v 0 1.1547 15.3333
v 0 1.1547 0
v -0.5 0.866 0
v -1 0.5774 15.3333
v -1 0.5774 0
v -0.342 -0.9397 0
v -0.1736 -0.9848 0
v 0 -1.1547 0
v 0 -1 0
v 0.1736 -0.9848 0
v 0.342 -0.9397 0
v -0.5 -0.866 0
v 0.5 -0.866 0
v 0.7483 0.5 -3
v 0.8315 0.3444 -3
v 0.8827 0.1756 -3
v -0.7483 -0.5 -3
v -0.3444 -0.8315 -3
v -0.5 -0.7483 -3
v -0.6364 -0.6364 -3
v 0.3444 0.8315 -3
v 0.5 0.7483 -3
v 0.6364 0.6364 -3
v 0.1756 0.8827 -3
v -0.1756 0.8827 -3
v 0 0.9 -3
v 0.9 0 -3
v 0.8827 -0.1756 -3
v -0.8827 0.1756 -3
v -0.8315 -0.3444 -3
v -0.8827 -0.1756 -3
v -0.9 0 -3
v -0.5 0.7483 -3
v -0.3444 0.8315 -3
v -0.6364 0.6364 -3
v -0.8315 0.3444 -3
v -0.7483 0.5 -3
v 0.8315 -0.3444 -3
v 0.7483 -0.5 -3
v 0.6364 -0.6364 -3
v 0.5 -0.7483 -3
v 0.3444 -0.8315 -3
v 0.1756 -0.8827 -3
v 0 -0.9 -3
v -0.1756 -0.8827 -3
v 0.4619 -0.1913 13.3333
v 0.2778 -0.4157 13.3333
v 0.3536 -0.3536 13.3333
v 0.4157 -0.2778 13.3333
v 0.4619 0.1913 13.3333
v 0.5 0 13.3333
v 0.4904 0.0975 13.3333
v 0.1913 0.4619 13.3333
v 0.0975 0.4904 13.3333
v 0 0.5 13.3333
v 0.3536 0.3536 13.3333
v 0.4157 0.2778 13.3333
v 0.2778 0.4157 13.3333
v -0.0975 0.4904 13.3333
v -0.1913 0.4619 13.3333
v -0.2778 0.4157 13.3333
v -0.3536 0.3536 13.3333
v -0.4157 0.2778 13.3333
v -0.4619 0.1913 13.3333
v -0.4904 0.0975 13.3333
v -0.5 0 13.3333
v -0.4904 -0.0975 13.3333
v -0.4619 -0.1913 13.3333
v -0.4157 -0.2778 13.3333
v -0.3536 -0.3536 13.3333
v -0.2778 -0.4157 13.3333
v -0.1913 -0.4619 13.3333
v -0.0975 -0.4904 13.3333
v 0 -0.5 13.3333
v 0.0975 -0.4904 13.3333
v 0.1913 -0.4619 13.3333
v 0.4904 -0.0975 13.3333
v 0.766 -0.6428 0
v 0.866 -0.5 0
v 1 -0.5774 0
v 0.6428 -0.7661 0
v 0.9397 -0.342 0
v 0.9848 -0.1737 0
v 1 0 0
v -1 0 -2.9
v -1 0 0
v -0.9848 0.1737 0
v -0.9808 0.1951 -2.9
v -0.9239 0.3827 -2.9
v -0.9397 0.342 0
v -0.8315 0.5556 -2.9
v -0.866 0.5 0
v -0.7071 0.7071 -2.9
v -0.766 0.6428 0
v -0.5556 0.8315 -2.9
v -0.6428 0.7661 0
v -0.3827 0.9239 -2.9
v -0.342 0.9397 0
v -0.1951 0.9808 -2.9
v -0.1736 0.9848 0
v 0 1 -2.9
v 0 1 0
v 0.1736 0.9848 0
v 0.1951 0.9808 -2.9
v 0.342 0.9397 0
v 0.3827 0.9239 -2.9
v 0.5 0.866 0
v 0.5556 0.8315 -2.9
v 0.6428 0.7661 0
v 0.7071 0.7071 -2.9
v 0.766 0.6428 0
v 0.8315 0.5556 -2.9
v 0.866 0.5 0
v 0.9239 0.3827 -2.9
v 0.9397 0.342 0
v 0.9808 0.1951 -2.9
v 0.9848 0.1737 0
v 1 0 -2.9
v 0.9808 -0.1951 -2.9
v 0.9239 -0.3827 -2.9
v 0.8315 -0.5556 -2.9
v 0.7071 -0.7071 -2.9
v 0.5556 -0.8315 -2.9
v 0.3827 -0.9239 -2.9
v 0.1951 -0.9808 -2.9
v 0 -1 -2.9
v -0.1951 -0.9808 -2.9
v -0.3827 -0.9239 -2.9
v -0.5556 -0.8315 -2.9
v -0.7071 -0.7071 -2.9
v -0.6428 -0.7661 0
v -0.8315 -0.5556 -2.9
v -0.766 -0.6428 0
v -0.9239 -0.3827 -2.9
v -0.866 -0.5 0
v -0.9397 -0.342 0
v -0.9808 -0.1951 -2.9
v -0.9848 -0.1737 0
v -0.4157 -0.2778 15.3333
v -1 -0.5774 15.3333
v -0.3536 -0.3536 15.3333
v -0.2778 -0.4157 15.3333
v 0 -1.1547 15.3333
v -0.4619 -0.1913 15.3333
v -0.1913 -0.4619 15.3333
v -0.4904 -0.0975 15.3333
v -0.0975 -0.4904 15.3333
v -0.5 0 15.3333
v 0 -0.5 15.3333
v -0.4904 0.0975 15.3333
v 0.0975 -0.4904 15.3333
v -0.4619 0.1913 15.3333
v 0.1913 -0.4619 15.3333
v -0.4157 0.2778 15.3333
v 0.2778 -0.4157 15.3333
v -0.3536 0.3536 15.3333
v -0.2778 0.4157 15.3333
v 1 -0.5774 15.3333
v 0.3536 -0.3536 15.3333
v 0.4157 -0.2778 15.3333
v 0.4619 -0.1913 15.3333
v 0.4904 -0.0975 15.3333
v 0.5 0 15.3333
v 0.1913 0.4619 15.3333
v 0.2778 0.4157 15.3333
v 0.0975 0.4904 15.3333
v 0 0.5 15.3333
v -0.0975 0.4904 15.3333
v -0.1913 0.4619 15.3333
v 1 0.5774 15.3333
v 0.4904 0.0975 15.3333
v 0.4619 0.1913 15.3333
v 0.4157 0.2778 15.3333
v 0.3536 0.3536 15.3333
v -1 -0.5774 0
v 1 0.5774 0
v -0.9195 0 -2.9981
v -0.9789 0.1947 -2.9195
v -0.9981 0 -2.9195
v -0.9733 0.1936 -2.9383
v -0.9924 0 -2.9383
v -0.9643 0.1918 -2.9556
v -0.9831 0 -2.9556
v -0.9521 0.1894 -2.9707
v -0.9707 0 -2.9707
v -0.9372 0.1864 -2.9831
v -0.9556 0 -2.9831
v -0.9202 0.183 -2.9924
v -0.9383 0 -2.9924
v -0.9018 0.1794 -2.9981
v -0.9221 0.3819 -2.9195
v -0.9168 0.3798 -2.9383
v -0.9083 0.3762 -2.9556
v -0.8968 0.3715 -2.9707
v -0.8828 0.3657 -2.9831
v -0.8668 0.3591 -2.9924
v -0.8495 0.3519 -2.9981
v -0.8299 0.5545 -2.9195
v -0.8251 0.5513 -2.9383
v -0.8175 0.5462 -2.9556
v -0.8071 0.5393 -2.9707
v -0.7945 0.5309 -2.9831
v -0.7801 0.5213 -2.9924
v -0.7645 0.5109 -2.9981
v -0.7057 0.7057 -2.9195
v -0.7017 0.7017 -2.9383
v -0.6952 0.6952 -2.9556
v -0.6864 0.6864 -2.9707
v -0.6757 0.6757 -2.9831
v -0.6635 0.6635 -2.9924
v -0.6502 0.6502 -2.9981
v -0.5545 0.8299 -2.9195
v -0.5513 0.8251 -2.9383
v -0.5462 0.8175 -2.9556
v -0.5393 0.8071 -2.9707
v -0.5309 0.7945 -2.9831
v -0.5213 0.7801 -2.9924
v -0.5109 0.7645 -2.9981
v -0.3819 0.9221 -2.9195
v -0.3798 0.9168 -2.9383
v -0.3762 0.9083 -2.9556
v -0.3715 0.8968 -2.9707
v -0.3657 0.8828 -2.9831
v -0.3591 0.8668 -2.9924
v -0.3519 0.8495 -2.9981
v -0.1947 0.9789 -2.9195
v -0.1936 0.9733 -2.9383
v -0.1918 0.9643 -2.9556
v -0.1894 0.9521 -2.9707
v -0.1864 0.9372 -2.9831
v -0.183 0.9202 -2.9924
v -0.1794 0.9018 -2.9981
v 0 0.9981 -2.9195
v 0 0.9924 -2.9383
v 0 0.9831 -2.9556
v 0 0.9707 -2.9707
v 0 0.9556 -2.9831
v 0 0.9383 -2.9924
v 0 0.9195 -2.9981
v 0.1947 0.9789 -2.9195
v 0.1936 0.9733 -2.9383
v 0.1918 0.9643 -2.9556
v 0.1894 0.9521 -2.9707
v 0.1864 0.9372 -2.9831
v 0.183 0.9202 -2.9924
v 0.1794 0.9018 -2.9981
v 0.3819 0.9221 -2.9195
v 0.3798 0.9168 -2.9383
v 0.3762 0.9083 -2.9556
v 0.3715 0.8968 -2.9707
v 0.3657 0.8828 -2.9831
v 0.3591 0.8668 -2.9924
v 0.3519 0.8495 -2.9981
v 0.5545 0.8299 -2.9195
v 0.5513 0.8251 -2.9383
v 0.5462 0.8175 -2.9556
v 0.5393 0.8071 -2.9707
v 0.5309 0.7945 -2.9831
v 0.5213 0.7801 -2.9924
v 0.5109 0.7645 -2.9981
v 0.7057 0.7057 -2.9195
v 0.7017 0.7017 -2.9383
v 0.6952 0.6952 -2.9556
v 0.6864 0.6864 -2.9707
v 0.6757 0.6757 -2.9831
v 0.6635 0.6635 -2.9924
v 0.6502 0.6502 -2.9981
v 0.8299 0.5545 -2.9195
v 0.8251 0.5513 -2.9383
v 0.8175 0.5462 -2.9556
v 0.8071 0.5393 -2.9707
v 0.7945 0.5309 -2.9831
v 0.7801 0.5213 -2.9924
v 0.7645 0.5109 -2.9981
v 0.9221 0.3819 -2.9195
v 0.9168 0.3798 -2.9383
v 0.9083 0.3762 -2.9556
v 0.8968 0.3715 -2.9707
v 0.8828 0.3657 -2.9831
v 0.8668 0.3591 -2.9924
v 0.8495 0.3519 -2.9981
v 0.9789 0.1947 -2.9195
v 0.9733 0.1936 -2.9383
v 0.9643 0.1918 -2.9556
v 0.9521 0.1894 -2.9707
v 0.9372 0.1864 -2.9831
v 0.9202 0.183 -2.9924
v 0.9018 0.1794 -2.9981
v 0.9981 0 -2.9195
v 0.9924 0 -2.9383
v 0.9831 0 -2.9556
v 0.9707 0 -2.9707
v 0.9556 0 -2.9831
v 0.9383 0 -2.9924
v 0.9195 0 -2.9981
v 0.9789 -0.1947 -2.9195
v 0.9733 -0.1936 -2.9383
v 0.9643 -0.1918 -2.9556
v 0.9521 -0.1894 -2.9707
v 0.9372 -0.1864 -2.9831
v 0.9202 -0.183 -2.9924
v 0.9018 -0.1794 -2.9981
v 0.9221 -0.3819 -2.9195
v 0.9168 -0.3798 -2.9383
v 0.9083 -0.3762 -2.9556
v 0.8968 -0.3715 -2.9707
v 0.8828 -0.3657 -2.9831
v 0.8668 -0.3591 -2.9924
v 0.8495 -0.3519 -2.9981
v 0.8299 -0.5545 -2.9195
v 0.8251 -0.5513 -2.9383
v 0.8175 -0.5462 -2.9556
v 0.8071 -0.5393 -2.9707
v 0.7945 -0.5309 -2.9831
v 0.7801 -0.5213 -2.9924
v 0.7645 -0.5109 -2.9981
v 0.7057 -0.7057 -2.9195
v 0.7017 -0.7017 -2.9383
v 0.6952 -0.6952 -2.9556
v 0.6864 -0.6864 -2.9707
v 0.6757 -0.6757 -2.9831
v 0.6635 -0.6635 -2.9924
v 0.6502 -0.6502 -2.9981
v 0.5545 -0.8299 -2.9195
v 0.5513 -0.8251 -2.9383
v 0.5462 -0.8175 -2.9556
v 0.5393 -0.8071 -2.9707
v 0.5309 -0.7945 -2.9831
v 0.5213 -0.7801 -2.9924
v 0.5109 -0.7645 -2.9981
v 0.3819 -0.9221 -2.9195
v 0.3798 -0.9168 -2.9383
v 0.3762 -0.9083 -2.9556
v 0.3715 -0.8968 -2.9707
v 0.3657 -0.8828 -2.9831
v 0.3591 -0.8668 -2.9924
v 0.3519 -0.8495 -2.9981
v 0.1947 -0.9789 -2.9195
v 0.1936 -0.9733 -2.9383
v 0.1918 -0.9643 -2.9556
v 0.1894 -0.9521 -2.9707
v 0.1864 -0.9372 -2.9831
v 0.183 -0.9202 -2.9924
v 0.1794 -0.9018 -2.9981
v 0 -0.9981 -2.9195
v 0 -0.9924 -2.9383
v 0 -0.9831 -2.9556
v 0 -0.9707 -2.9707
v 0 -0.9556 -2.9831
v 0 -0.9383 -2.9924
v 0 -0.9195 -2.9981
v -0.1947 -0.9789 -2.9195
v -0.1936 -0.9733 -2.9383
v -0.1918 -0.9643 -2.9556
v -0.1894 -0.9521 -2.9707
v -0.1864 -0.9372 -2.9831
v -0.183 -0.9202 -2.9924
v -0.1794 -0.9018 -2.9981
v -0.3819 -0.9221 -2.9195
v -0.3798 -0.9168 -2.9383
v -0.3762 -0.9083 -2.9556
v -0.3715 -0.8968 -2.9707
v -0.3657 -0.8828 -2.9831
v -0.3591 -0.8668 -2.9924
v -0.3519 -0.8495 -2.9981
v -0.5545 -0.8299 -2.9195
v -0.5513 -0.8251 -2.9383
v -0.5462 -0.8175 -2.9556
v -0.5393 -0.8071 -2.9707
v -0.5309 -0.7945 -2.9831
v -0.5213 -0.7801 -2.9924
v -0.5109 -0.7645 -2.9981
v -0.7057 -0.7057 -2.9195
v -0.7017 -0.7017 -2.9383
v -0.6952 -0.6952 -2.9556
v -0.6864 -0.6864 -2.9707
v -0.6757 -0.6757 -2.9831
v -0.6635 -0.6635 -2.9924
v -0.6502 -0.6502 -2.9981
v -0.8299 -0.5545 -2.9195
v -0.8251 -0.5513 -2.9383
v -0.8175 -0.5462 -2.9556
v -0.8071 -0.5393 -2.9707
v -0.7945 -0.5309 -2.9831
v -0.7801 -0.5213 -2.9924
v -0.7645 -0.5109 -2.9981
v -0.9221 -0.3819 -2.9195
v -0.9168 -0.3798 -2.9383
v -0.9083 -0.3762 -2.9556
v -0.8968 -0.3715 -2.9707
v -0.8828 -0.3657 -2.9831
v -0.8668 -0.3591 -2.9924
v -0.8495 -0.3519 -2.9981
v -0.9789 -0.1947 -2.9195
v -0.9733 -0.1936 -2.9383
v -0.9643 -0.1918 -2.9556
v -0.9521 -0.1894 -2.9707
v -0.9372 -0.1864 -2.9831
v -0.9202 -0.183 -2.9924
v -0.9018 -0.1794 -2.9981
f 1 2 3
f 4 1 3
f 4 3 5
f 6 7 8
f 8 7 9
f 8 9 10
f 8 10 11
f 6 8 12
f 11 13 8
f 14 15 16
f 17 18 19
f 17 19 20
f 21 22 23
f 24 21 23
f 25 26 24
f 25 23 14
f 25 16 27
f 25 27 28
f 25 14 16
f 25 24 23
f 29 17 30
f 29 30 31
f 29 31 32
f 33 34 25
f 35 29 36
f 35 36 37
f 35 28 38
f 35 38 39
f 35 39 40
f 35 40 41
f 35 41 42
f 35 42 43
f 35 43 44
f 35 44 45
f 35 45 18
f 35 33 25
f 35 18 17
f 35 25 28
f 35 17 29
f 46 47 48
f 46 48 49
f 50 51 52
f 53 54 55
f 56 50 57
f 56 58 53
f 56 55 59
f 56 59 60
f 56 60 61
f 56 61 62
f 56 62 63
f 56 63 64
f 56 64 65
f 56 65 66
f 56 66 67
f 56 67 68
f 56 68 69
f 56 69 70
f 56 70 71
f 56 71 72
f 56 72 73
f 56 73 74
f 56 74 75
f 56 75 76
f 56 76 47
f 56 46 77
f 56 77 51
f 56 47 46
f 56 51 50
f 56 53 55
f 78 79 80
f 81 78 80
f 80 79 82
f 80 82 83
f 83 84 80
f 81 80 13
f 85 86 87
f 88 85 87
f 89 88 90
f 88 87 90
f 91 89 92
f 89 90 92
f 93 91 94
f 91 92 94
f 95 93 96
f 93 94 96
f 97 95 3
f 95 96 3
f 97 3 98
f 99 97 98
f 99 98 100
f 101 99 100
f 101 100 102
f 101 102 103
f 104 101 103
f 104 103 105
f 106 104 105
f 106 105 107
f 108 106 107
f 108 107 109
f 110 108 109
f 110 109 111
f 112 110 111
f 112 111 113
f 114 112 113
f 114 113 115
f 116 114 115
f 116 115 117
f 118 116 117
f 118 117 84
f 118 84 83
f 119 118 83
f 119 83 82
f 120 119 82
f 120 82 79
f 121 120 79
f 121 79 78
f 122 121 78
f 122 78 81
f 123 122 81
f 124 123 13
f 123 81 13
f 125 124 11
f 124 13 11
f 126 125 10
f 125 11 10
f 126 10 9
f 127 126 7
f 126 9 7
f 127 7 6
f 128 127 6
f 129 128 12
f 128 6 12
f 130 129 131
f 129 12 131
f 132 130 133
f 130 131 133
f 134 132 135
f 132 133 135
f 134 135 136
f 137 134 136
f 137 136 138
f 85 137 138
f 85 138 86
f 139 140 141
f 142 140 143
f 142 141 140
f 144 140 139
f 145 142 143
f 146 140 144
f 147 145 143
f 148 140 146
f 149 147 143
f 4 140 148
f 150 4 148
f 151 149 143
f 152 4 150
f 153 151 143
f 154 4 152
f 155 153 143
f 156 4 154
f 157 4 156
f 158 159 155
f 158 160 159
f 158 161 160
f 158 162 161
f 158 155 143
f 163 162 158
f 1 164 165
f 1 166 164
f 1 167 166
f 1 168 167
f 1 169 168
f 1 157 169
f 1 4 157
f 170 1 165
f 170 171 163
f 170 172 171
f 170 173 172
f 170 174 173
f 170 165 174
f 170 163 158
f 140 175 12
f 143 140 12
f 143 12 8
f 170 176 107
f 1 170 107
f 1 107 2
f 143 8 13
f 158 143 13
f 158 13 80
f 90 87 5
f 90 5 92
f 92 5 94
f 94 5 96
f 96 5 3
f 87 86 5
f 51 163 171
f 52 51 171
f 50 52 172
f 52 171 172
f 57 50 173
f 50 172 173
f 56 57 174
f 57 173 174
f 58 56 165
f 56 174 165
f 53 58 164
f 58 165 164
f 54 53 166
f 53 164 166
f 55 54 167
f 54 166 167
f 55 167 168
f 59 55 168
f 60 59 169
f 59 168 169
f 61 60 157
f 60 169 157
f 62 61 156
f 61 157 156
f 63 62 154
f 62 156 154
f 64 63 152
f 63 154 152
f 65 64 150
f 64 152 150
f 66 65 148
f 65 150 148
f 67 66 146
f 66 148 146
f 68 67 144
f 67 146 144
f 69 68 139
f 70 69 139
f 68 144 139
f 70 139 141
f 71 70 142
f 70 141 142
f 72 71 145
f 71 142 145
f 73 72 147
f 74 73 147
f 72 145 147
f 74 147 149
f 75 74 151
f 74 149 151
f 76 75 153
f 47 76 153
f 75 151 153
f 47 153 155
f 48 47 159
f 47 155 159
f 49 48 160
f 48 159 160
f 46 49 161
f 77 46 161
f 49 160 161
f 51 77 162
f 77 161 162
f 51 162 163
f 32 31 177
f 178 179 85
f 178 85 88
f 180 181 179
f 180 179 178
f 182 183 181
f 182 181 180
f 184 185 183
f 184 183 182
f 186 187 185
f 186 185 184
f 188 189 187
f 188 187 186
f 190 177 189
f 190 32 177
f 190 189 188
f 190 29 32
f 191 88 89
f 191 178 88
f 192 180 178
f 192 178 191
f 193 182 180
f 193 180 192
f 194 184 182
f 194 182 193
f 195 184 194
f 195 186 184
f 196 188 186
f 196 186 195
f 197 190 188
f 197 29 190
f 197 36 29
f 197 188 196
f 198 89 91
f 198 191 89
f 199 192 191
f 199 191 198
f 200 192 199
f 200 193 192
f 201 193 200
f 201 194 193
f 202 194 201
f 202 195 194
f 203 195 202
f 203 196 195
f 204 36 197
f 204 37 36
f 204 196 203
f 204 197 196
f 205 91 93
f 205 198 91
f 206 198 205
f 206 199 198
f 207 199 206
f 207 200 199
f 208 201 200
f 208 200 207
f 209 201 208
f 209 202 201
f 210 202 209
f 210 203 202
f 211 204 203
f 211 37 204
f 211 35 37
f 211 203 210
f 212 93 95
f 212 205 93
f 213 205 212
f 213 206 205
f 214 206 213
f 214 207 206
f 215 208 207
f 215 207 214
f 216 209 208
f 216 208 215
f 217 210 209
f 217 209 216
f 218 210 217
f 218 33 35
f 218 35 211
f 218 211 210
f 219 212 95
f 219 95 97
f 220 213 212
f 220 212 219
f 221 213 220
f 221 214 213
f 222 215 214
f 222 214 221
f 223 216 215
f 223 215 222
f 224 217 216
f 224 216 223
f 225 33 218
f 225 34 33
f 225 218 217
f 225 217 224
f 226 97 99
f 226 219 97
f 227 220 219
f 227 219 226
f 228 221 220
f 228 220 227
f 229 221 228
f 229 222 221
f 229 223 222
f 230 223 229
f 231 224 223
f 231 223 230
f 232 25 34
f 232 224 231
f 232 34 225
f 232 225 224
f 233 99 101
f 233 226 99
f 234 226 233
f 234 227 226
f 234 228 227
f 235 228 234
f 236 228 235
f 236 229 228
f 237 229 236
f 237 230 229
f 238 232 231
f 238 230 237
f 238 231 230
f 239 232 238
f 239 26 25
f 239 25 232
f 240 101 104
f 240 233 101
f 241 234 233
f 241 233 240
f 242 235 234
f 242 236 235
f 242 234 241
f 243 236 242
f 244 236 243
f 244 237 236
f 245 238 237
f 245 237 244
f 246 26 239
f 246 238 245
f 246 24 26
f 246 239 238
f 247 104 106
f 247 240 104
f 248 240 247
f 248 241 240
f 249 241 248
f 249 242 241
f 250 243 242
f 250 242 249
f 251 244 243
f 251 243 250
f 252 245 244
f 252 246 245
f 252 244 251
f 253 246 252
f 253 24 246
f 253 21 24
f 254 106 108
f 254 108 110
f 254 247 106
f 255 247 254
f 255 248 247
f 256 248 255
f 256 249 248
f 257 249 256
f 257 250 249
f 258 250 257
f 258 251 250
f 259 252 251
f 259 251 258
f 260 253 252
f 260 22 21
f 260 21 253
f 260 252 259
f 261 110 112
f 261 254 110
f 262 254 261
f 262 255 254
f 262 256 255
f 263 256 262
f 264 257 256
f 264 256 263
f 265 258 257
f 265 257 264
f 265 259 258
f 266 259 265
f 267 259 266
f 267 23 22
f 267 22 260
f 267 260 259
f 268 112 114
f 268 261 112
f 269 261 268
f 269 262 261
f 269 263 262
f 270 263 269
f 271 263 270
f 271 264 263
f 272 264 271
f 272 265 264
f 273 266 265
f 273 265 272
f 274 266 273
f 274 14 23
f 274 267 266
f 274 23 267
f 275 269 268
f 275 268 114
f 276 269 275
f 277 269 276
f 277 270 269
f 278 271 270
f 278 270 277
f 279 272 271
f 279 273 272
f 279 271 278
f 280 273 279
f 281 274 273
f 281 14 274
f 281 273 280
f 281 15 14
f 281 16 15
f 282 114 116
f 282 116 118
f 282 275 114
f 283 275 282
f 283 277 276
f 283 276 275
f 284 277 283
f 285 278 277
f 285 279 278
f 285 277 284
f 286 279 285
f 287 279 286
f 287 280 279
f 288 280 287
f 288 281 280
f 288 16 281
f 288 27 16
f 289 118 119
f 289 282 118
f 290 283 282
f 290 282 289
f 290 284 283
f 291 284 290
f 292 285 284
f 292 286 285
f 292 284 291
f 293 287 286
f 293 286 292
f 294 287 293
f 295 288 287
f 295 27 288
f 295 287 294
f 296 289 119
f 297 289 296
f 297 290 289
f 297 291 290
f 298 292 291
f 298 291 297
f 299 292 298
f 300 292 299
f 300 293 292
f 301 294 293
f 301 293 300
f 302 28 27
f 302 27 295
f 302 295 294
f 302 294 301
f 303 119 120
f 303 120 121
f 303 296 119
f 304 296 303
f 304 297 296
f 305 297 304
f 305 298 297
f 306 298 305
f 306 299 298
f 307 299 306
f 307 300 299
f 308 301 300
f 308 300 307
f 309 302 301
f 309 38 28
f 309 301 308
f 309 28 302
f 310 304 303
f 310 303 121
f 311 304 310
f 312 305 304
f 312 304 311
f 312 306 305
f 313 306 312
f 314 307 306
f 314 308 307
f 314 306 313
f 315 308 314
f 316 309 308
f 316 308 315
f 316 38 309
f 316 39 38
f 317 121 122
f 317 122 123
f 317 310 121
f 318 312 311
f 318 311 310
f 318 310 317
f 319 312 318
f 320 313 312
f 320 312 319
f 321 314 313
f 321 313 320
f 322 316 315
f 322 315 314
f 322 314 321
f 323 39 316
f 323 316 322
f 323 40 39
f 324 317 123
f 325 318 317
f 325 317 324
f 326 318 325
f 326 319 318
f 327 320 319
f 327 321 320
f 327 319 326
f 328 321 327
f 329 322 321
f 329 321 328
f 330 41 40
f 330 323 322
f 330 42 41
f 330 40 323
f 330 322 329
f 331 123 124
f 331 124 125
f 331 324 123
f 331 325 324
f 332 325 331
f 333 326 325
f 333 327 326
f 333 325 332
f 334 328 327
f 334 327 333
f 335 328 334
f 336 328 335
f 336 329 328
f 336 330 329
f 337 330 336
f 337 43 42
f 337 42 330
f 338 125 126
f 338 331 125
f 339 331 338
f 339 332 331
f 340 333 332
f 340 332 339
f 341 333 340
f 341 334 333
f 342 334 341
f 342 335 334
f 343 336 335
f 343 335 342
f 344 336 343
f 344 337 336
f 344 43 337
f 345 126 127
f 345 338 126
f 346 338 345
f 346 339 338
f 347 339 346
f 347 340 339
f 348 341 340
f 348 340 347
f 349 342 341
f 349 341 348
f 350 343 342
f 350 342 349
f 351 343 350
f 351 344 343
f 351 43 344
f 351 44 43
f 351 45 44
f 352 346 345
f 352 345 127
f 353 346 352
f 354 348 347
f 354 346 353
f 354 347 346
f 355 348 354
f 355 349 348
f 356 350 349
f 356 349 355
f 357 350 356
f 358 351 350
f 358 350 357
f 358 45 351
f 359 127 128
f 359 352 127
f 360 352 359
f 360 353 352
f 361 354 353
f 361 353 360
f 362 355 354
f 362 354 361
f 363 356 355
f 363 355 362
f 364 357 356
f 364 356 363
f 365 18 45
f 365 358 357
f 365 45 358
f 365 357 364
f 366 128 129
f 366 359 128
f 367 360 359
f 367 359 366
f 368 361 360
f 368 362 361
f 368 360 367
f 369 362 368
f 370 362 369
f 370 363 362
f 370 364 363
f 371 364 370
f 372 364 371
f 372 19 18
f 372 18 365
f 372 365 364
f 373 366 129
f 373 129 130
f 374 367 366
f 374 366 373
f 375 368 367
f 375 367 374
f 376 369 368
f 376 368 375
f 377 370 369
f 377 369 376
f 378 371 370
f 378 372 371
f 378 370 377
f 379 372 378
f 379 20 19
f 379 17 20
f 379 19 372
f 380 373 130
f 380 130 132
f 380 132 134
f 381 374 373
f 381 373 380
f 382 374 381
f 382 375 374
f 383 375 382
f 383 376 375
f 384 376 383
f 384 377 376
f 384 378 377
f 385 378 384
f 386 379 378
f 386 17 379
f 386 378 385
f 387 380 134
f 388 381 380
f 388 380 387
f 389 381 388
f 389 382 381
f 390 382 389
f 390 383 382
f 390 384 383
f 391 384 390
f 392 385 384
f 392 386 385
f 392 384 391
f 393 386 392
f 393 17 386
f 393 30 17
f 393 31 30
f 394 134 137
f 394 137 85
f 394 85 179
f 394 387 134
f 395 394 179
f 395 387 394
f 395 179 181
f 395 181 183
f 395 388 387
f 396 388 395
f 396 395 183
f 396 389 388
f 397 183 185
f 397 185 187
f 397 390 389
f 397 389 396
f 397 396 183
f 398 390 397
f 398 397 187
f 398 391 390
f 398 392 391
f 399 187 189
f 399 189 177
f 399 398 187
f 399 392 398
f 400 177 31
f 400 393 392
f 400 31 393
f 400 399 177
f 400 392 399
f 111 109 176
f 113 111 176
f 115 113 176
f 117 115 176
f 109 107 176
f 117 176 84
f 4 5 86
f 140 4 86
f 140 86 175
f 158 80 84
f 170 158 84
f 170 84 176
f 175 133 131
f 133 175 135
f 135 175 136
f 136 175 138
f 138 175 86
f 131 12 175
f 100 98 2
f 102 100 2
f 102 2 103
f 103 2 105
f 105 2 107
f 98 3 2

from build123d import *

# Parameters (mm, degrees)
BOSS_EXTRUDE1_DEPTH = 15.333333333
SKETCH2_R           = 0.5
CUT_EXTRUDE1_DEPTH  = 2
SKETCH3_R           = 1
BOSS_EXTRUDE2_DEPTH = 3
FILLET1_R           = 0.1


with BuildPart() as part:
    # Sketch1 → Boss-Extrude1 (new body)
    with BuildSketch(Plane.XY):
        Polygon((0, 1.154700538), (-1, 0.577350269), (-1, -0.577350269), (0, -1.154700538), (1, -0.577350269), (1, 0.577350269), align=None)
    extrude(amount=BOSS_EXTRUDE1_DEPTH)

    # Sketch2 → Cut-Extrude1 (cut)
    with BuildSketch(Plane.XY.offset(15.333333333)):
        Circle(SKETCH2_R)
    extrude(amount=-CUT_EXTRUDE1_DEPTH, mode=Mode.SUBTRACT)

    # Sketch3 → Boss-Extrude2 (add)
    with BuildSketch(Plane(origin=(0, 0, 0), x_dir=(-1, 0, 0), z_dir=(0, 0, -1))):
        Circle(SKETCH3_R)
    extrude(amount=BOSS_EXTRUDE2_DEPTH)

    # Fillet1
    fillet1_edges = [part.edges().sort_by_distance(p)[0] for p in [
        (1, 0, -3),
    ]]
    fillet(fillet1_edges, radius=FILLET1_R)


solid = part.part
